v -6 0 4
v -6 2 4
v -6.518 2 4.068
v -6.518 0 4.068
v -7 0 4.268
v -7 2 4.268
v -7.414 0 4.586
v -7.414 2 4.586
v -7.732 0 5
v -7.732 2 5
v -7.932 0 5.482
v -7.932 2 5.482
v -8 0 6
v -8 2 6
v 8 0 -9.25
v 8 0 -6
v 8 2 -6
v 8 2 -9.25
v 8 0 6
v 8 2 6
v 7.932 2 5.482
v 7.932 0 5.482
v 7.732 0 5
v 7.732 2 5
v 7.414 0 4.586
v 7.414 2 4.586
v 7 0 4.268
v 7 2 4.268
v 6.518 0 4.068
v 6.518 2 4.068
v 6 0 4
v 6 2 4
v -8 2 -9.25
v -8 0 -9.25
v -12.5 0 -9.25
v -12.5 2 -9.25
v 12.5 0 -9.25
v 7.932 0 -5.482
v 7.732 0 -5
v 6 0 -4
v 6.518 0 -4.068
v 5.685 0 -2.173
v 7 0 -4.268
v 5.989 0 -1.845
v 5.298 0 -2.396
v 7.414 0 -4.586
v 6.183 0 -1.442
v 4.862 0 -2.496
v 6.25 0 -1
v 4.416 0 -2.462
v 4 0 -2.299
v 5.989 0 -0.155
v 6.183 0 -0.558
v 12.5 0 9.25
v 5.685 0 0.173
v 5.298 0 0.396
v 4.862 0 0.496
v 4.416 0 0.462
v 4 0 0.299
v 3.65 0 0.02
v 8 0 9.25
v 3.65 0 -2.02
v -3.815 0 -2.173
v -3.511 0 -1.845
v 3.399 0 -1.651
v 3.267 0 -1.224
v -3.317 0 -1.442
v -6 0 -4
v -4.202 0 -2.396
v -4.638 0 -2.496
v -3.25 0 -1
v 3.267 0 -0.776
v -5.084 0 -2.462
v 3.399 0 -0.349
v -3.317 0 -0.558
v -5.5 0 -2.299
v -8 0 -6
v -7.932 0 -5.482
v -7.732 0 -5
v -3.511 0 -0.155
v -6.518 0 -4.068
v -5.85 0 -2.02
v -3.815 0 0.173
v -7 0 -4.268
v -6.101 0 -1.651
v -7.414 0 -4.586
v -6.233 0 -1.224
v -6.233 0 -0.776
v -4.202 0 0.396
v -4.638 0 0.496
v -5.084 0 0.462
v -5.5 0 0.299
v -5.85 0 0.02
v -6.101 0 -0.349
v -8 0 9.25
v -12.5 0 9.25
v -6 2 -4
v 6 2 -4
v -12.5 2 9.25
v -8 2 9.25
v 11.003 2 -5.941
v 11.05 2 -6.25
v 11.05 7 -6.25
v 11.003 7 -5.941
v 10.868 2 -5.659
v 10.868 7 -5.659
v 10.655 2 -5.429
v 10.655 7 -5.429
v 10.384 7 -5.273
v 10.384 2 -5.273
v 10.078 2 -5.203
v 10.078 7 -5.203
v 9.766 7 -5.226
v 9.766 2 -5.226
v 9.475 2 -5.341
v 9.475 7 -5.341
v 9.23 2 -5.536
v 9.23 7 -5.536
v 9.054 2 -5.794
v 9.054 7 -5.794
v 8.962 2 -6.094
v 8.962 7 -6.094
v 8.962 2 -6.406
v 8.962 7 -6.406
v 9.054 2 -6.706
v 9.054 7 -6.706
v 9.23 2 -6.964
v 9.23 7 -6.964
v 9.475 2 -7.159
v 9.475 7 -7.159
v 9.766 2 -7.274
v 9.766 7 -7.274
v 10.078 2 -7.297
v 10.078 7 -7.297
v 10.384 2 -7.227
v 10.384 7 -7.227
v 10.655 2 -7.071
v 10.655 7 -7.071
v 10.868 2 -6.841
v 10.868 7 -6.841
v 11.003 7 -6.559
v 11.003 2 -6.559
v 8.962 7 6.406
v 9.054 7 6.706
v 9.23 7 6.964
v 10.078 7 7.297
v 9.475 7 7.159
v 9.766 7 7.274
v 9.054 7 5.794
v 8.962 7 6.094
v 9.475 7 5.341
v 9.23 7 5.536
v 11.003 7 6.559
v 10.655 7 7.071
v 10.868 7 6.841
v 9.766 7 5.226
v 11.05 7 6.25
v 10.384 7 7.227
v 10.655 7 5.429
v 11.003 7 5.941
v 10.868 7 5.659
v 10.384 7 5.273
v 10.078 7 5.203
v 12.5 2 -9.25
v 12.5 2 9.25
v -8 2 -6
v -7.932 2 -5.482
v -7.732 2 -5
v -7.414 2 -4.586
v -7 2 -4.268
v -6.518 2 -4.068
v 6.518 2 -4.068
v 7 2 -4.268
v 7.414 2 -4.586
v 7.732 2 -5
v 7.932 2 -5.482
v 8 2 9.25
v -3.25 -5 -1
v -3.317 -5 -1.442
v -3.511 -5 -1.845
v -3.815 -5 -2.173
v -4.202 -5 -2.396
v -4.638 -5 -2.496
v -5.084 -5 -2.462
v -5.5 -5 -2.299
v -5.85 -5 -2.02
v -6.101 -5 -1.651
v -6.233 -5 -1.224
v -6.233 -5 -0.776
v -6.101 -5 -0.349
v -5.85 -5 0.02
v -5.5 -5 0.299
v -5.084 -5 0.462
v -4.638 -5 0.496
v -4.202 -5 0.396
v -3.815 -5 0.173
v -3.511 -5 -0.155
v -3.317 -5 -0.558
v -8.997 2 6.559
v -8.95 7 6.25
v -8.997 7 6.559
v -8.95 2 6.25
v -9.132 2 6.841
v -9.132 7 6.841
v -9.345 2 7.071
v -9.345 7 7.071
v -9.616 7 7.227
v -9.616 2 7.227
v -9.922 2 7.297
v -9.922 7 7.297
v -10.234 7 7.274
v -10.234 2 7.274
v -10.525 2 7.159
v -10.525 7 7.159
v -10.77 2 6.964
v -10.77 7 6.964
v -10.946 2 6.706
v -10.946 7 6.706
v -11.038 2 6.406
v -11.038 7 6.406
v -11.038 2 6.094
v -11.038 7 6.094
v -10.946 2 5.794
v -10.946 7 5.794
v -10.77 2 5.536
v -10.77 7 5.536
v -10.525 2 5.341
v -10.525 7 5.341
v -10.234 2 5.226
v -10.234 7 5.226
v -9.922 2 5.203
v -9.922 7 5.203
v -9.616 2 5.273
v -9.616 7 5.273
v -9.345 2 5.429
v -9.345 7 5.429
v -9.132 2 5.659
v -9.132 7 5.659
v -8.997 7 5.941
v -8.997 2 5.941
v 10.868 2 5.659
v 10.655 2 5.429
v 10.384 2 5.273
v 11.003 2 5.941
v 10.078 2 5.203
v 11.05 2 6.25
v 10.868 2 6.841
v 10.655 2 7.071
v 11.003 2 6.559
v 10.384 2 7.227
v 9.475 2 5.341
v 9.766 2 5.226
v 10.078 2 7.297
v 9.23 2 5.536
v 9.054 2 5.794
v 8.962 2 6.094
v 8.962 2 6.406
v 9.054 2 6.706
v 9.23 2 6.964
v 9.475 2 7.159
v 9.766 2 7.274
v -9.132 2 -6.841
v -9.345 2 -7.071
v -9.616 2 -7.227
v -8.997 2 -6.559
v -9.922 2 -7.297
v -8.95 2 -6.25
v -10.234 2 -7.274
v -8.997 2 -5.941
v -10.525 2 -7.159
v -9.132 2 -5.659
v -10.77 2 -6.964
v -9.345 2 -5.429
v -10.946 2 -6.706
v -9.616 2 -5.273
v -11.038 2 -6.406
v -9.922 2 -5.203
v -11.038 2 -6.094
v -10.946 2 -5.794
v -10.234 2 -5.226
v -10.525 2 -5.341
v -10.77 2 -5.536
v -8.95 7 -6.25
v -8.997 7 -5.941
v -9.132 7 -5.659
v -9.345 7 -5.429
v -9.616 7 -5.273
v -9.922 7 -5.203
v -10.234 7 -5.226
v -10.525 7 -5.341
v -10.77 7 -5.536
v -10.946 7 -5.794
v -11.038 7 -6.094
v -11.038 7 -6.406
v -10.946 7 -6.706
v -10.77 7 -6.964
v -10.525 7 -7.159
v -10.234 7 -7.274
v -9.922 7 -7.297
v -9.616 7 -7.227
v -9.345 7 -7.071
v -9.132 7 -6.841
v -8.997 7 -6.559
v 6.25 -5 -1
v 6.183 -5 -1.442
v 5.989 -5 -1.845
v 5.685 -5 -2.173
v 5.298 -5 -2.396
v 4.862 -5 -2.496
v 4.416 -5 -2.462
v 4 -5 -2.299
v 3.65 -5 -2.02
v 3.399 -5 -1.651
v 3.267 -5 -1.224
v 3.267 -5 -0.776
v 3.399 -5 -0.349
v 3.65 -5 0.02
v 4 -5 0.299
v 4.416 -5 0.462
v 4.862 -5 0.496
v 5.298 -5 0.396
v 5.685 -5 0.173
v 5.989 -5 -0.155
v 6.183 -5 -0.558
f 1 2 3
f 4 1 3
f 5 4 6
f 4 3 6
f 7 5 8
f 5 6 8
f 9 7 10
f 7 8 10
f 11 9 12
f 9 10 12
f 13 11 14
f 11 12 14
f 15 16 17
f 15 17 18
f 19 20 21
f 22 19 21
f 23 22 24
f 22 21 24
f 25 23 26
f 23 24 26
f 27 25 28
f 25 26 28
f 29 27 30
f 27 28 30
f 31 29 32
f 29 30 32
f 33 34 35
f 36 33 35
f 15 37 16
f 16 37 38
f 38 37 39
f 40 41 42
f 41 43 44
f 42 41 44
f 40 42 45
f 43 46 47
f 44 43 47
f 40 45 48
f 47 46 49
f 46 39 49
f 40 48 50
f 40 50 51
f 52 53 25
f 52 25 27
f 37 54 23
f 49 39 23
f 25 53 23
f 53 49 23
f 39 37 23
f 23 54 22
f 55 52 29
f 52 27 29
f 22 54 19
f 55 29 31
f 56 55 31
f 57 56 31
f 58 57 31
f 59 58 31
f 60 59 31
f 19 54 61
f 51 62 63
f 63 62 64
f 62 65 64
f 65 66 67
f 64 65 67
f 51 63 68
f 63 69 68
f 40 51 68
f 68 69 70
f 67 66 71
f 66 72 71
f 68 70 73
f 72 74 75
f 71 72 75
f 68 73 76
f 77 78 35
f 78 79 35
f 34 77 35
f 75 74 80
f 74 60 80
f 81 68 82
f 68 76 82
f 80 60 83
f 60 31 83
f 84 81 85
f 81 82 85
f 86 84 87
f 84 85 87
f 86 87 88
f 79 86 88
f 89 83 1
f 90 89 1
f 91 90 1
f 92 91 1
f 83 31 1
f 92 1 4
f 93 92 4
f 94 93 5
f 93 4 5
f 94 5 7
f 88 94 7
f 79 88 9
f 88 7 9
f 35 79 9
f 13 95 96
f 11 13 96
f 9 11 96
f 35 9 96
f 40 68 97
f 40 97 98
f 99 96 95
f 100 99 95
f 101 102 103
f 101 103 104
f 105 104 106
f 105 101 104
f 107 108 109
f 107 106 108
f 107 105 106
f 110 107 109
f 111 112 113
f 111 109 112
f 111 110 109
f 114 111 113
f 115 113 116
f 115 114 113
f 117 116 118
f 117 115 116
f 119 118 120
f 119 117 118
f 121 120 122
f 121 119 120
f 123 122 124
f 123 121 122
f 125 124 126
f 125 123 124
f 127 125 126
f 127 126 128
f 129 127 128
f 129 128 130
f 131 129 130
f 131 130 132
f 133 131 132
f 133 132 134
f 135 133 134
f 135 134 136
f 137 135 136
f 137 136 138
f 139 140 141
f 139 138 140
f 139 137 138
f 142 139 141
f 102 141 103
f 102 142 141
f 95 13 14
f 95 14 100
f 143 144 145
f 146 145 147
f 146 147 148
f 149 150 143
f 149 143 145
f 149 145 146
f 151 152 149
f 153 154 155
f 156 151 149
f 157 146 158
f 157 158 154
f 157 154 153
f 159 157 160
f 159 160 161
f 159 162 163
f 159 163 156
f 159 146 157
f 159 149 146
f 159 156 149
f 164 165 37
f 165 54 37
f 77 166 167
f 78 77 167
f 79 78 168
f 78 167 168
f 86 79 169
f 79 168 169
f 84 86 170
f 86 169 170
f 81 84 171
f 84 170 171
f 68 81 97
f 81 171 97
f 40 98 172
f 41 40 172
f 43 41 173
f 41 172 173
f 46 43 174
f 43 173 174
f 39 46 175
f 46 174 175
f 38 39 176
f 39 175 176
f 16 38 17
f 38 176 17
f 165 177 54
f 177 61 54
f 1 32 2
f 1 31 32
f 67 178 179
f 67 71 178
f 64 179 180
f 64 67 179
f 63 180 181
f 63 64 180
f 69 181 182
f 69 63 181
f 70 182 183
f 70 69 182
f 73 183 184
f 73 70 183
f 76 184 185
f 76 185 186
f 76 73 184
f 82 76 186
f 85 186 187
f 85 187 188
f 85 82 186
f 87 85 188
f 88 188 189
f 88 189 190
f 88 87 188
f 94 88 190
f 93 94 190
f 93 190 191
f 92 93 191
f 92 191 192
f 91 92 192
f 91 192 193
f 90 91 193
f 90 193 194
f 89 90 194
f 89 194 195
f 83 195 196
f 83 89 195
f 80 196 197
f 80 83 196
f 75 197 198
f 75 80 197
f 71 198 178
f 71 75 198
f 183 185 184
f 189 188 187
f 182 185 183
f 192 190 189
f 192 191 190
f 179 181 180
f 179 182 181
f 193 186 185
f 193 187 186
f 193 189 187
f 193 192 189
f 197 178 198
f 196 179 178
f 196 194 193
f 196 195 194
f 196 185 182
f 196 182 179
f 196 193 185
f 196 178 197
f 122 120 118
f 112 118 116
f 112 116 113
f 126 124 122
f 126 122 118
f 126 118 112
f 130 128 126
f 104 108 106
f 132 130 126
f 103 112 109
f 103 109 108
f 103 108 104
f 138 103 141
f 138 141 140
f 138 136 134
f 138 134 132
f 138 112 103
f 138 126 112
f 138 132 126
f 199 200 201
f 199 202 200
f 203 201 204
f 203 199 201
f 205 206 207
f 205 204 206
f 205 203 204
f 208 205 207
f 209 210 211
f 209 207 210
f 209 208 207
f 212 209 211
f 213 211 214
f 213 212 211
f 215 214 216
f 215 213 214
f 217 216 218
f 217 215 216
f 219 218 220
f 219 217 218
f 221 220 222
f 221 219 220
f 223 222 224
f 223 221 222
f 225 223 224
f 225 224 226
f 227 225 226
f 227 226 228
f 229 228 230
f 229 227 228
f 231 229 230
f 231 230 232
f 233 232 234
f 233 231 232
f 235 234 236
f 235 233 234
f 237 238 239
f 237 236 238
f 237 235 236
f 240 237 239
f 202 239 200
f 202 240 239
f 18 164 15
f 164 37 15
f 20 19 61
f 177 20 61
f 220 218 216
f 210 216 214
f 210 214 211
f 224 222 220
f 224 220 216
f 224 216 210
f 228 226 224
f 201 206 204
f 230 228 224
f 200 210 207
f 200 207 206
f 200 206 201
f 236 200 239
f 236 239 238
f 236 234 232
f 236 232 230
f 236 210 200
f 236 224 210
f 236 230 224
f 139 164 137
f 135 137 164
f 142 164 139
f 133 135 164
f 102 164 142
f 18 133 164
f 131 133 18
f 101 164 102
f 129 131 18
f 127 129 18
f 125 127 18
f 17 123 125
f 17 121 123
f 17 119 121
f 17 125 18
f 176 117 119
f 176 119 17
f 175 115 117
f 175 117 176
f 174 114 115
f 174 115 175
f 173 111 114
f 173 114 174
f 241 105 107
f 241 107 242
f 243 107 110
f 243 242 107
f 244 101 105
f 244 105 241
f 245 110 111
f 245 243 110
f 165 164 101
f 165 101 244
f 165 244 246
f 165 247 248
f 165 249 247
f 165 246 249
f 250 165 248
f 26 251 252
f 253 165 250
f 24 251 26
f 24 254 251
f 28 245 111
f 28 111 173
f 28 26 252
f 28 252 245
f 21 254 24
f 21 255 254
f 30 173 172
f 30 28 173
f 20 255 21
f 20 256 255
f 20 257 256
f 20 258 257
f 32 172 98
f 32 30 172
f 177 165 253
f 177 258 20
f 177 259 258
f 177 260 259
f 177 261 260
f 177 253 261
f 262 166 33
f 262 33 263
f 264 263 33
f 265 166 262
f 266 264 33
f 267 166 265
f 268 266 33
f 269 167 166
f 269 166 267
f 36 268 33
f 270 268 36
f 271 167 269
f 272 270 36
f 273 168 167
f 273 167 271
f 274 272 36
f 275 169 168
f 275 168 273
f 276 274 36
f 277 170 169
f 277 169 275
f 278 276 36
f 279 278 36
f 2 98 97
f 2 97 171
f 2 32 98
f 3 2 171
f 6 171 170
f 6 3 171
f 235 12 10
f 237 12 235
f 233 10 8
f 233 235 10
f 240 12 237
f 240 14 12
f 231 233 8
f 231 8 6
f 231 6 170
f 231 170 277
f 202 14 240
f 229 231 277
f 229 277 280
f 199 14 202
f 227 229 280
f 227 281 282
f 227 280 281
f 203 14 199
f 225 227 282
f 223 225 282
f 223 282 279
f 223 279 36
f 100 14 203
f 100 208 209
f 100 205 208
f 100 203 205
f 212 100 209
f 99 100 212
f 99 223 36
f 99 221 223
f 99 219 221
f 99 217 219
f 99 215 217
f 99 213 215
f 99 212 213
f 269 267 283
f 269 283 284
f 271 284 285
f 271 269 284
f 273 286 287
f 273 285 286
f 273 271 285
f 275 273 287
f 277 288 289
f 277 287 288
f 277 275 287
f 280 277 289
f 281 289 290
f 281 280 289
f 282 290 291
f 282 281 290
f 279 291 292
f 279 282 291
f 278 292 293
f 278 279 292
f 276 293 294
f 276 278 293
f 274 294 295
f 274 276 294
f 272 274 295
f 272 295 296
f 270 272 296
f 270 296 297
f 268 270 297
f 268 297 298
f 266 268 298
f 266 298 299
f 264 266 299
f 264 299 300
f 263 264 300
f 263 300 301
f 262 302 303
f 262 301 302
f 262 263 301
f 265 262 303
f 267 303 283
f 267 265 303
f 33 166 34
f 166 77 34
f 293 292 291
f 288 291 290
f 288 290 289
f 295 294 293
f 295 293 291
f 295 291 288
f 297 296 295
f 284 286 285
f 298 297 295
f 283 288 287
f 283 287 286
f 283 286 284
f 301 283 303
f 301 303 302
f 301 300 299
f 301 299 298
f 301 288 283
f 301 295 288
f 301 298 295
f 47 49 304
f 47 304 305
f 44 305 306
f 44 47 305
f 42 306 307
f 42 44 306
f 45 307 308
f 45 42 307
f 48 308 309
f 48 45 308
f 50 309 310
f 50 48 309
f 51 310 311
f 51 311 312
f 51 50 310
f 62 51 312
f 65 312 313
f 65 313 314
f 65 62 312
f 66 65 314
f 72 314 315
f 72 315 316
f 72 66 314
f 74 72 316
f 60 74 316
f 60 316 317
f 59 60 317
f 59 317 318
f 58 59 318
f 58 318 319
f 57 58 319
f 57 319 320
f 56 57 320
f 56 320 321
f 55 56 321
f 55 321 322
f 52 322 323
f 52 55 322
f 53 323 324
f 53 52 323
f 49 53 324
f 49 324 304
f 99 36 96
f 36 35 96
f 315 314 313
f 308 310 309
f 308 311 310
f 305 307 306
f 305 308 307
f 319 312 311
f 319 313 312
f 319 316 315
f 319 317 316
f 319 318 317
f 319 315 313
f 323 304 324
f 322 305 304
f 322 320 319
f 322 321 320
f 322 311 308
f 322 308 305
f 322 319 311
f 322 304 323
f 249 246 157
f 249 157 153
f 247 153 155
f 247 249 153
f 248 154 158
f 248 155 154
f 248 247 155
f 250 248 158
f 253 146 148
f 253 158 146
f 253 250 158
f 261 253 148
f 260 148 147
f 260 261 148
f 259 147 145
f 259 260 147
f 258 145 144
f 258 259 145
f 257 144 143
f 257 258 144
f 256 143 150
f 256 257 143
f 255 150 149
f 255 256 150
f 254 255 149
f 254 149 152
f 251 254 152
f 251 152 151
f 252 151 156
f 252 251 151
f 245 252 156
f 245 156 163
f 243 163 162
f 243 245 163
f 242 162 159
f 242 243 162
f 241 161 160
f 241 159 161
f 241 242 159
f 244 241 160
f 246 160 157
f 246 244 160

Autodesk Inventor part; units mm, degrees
ref_plane "YZ Plane" through (0, 0, 0) normal (1, 0, 0) x (0, 1, 0)
ref_plane "XZ Plane" through (0, 0, 0) normal (0, 1, 0) x (-1, 0, 0)
ref_plane "XY Plane" through (0, 0, 0) normal (0, 0, 1) x (1, 0, 0)
sketch "Sketch1" plane through (0, 0, 0) normal (0, 1, 0) x (-1, 0, 0)
  line L0 (12.5, 9.25) -> (-12.5, 9.25)
  line L1 (-12.5, 9.25) -> (-12.5, -9.25)
  line L2 (-12.5, -9.25) -> (12.5, -9.25)
  line L3 (12.5, -9.25) -> (12.5, 9.25)
  line L4 (12.5, 9.25) -> (-12.5, -9.25) construction
  line L5 (-12.5, 9.25) -> (12.5, -9.25) construction
  line L6 (8, -4) -> (-8, -4)
  line L7 (-8, 4) -> (8, 4)
  line L8 (-17.5, 0) -> (17.5, 0) projected
  line L9 (8, -4) -> (8, -9.25)
  line L10 (8, 4) -> (8, 9.25)
  line L11 (-8, -4) -> (-8, -9.25)
  line L12 (-8, 4) -> (-8, 9.25)
  line L13 (0, -12.95) -> (0, 12.95) projected
  point P0 (0, 0)
  dimension "d0" = 25
  dimension "d1" = 18.5
  dimension "d24" = 8
  dimension "d25" = 16
extrude "Extrusion1" add sketch "Sketch1" along normal blind 2 contours L3 L8 L13 L7 L10 L0 | L3 L2 L9 L6 L13 L8 | L13 L6 L11 L2 L1 L8 | L8 L1 L0 L12 L7 L13
sketch "Sketch2" plane through (0, 2, 0) normal (0, 1, 0) x (1, 0, 0)
  line L0 (17.5, 0) -> (-17.5, 0) projected
  line L1 (0, 12.95) -> (0, -12.95) projected
  line L2 (-10, -6.25) -> (10, -6.25) construction
  line L3 (10, -6.25) -> (10, 6.25) construction
  line L4 (10, 6.25) -> (-10, 6.25) construction
  line L5 (-10, 6.25) -> (-10, -6.25) construction
  line L6 (-10, -6.25) -> (10, 6.25) construction
  line L7 (10, -6.25) -> (-10, 6.25) construction
  line L8 (-10, 0) -> (10, 0) construction
  circle A0 centre (10, -6.25) radius 1.05
  circle A1 centre (10, 6.25) radius 1.05
  circle A2 centre (-10, 6.25) radius 1.05
  circle A3 centre (-10, -6.25) radius 1.05
  point P0 (0, 0)
  dimension "d5" = 20
  dimension "d6" = 12.5
  dimension "d10" = 2.1
extrude "Extrusion2" add sketch "Sketch2" along normal blind 5
sketch "Sketch5" plane through (0, 0, 0) normal (0, -1, 0) x (1, 0, 0)
  line L0 (0, 12.95) -> (0, -12.95) projected
  line L1 (-17.5, 0) -> (17.5, 0) projected
  circle A0 centre (-4.75, -1) radius 1.5
  circle A1 centre (4.75, -1) radius 1.5
  point P0 (0, 0)
  dimension "d26" = 3
  dimension "d27" = 3
  dimension "d28" = 1
  dimension "d29" = 9.5
extrude "Extrusion4" add sketch "Sketch5" along normal blind 5
fillet "Fillet1" radius 2 4 edges at (-8, 1, 4) (8, 1, 4) (8, 1, -4) (-8, 1, -4)
properties part number "IMU mount"
